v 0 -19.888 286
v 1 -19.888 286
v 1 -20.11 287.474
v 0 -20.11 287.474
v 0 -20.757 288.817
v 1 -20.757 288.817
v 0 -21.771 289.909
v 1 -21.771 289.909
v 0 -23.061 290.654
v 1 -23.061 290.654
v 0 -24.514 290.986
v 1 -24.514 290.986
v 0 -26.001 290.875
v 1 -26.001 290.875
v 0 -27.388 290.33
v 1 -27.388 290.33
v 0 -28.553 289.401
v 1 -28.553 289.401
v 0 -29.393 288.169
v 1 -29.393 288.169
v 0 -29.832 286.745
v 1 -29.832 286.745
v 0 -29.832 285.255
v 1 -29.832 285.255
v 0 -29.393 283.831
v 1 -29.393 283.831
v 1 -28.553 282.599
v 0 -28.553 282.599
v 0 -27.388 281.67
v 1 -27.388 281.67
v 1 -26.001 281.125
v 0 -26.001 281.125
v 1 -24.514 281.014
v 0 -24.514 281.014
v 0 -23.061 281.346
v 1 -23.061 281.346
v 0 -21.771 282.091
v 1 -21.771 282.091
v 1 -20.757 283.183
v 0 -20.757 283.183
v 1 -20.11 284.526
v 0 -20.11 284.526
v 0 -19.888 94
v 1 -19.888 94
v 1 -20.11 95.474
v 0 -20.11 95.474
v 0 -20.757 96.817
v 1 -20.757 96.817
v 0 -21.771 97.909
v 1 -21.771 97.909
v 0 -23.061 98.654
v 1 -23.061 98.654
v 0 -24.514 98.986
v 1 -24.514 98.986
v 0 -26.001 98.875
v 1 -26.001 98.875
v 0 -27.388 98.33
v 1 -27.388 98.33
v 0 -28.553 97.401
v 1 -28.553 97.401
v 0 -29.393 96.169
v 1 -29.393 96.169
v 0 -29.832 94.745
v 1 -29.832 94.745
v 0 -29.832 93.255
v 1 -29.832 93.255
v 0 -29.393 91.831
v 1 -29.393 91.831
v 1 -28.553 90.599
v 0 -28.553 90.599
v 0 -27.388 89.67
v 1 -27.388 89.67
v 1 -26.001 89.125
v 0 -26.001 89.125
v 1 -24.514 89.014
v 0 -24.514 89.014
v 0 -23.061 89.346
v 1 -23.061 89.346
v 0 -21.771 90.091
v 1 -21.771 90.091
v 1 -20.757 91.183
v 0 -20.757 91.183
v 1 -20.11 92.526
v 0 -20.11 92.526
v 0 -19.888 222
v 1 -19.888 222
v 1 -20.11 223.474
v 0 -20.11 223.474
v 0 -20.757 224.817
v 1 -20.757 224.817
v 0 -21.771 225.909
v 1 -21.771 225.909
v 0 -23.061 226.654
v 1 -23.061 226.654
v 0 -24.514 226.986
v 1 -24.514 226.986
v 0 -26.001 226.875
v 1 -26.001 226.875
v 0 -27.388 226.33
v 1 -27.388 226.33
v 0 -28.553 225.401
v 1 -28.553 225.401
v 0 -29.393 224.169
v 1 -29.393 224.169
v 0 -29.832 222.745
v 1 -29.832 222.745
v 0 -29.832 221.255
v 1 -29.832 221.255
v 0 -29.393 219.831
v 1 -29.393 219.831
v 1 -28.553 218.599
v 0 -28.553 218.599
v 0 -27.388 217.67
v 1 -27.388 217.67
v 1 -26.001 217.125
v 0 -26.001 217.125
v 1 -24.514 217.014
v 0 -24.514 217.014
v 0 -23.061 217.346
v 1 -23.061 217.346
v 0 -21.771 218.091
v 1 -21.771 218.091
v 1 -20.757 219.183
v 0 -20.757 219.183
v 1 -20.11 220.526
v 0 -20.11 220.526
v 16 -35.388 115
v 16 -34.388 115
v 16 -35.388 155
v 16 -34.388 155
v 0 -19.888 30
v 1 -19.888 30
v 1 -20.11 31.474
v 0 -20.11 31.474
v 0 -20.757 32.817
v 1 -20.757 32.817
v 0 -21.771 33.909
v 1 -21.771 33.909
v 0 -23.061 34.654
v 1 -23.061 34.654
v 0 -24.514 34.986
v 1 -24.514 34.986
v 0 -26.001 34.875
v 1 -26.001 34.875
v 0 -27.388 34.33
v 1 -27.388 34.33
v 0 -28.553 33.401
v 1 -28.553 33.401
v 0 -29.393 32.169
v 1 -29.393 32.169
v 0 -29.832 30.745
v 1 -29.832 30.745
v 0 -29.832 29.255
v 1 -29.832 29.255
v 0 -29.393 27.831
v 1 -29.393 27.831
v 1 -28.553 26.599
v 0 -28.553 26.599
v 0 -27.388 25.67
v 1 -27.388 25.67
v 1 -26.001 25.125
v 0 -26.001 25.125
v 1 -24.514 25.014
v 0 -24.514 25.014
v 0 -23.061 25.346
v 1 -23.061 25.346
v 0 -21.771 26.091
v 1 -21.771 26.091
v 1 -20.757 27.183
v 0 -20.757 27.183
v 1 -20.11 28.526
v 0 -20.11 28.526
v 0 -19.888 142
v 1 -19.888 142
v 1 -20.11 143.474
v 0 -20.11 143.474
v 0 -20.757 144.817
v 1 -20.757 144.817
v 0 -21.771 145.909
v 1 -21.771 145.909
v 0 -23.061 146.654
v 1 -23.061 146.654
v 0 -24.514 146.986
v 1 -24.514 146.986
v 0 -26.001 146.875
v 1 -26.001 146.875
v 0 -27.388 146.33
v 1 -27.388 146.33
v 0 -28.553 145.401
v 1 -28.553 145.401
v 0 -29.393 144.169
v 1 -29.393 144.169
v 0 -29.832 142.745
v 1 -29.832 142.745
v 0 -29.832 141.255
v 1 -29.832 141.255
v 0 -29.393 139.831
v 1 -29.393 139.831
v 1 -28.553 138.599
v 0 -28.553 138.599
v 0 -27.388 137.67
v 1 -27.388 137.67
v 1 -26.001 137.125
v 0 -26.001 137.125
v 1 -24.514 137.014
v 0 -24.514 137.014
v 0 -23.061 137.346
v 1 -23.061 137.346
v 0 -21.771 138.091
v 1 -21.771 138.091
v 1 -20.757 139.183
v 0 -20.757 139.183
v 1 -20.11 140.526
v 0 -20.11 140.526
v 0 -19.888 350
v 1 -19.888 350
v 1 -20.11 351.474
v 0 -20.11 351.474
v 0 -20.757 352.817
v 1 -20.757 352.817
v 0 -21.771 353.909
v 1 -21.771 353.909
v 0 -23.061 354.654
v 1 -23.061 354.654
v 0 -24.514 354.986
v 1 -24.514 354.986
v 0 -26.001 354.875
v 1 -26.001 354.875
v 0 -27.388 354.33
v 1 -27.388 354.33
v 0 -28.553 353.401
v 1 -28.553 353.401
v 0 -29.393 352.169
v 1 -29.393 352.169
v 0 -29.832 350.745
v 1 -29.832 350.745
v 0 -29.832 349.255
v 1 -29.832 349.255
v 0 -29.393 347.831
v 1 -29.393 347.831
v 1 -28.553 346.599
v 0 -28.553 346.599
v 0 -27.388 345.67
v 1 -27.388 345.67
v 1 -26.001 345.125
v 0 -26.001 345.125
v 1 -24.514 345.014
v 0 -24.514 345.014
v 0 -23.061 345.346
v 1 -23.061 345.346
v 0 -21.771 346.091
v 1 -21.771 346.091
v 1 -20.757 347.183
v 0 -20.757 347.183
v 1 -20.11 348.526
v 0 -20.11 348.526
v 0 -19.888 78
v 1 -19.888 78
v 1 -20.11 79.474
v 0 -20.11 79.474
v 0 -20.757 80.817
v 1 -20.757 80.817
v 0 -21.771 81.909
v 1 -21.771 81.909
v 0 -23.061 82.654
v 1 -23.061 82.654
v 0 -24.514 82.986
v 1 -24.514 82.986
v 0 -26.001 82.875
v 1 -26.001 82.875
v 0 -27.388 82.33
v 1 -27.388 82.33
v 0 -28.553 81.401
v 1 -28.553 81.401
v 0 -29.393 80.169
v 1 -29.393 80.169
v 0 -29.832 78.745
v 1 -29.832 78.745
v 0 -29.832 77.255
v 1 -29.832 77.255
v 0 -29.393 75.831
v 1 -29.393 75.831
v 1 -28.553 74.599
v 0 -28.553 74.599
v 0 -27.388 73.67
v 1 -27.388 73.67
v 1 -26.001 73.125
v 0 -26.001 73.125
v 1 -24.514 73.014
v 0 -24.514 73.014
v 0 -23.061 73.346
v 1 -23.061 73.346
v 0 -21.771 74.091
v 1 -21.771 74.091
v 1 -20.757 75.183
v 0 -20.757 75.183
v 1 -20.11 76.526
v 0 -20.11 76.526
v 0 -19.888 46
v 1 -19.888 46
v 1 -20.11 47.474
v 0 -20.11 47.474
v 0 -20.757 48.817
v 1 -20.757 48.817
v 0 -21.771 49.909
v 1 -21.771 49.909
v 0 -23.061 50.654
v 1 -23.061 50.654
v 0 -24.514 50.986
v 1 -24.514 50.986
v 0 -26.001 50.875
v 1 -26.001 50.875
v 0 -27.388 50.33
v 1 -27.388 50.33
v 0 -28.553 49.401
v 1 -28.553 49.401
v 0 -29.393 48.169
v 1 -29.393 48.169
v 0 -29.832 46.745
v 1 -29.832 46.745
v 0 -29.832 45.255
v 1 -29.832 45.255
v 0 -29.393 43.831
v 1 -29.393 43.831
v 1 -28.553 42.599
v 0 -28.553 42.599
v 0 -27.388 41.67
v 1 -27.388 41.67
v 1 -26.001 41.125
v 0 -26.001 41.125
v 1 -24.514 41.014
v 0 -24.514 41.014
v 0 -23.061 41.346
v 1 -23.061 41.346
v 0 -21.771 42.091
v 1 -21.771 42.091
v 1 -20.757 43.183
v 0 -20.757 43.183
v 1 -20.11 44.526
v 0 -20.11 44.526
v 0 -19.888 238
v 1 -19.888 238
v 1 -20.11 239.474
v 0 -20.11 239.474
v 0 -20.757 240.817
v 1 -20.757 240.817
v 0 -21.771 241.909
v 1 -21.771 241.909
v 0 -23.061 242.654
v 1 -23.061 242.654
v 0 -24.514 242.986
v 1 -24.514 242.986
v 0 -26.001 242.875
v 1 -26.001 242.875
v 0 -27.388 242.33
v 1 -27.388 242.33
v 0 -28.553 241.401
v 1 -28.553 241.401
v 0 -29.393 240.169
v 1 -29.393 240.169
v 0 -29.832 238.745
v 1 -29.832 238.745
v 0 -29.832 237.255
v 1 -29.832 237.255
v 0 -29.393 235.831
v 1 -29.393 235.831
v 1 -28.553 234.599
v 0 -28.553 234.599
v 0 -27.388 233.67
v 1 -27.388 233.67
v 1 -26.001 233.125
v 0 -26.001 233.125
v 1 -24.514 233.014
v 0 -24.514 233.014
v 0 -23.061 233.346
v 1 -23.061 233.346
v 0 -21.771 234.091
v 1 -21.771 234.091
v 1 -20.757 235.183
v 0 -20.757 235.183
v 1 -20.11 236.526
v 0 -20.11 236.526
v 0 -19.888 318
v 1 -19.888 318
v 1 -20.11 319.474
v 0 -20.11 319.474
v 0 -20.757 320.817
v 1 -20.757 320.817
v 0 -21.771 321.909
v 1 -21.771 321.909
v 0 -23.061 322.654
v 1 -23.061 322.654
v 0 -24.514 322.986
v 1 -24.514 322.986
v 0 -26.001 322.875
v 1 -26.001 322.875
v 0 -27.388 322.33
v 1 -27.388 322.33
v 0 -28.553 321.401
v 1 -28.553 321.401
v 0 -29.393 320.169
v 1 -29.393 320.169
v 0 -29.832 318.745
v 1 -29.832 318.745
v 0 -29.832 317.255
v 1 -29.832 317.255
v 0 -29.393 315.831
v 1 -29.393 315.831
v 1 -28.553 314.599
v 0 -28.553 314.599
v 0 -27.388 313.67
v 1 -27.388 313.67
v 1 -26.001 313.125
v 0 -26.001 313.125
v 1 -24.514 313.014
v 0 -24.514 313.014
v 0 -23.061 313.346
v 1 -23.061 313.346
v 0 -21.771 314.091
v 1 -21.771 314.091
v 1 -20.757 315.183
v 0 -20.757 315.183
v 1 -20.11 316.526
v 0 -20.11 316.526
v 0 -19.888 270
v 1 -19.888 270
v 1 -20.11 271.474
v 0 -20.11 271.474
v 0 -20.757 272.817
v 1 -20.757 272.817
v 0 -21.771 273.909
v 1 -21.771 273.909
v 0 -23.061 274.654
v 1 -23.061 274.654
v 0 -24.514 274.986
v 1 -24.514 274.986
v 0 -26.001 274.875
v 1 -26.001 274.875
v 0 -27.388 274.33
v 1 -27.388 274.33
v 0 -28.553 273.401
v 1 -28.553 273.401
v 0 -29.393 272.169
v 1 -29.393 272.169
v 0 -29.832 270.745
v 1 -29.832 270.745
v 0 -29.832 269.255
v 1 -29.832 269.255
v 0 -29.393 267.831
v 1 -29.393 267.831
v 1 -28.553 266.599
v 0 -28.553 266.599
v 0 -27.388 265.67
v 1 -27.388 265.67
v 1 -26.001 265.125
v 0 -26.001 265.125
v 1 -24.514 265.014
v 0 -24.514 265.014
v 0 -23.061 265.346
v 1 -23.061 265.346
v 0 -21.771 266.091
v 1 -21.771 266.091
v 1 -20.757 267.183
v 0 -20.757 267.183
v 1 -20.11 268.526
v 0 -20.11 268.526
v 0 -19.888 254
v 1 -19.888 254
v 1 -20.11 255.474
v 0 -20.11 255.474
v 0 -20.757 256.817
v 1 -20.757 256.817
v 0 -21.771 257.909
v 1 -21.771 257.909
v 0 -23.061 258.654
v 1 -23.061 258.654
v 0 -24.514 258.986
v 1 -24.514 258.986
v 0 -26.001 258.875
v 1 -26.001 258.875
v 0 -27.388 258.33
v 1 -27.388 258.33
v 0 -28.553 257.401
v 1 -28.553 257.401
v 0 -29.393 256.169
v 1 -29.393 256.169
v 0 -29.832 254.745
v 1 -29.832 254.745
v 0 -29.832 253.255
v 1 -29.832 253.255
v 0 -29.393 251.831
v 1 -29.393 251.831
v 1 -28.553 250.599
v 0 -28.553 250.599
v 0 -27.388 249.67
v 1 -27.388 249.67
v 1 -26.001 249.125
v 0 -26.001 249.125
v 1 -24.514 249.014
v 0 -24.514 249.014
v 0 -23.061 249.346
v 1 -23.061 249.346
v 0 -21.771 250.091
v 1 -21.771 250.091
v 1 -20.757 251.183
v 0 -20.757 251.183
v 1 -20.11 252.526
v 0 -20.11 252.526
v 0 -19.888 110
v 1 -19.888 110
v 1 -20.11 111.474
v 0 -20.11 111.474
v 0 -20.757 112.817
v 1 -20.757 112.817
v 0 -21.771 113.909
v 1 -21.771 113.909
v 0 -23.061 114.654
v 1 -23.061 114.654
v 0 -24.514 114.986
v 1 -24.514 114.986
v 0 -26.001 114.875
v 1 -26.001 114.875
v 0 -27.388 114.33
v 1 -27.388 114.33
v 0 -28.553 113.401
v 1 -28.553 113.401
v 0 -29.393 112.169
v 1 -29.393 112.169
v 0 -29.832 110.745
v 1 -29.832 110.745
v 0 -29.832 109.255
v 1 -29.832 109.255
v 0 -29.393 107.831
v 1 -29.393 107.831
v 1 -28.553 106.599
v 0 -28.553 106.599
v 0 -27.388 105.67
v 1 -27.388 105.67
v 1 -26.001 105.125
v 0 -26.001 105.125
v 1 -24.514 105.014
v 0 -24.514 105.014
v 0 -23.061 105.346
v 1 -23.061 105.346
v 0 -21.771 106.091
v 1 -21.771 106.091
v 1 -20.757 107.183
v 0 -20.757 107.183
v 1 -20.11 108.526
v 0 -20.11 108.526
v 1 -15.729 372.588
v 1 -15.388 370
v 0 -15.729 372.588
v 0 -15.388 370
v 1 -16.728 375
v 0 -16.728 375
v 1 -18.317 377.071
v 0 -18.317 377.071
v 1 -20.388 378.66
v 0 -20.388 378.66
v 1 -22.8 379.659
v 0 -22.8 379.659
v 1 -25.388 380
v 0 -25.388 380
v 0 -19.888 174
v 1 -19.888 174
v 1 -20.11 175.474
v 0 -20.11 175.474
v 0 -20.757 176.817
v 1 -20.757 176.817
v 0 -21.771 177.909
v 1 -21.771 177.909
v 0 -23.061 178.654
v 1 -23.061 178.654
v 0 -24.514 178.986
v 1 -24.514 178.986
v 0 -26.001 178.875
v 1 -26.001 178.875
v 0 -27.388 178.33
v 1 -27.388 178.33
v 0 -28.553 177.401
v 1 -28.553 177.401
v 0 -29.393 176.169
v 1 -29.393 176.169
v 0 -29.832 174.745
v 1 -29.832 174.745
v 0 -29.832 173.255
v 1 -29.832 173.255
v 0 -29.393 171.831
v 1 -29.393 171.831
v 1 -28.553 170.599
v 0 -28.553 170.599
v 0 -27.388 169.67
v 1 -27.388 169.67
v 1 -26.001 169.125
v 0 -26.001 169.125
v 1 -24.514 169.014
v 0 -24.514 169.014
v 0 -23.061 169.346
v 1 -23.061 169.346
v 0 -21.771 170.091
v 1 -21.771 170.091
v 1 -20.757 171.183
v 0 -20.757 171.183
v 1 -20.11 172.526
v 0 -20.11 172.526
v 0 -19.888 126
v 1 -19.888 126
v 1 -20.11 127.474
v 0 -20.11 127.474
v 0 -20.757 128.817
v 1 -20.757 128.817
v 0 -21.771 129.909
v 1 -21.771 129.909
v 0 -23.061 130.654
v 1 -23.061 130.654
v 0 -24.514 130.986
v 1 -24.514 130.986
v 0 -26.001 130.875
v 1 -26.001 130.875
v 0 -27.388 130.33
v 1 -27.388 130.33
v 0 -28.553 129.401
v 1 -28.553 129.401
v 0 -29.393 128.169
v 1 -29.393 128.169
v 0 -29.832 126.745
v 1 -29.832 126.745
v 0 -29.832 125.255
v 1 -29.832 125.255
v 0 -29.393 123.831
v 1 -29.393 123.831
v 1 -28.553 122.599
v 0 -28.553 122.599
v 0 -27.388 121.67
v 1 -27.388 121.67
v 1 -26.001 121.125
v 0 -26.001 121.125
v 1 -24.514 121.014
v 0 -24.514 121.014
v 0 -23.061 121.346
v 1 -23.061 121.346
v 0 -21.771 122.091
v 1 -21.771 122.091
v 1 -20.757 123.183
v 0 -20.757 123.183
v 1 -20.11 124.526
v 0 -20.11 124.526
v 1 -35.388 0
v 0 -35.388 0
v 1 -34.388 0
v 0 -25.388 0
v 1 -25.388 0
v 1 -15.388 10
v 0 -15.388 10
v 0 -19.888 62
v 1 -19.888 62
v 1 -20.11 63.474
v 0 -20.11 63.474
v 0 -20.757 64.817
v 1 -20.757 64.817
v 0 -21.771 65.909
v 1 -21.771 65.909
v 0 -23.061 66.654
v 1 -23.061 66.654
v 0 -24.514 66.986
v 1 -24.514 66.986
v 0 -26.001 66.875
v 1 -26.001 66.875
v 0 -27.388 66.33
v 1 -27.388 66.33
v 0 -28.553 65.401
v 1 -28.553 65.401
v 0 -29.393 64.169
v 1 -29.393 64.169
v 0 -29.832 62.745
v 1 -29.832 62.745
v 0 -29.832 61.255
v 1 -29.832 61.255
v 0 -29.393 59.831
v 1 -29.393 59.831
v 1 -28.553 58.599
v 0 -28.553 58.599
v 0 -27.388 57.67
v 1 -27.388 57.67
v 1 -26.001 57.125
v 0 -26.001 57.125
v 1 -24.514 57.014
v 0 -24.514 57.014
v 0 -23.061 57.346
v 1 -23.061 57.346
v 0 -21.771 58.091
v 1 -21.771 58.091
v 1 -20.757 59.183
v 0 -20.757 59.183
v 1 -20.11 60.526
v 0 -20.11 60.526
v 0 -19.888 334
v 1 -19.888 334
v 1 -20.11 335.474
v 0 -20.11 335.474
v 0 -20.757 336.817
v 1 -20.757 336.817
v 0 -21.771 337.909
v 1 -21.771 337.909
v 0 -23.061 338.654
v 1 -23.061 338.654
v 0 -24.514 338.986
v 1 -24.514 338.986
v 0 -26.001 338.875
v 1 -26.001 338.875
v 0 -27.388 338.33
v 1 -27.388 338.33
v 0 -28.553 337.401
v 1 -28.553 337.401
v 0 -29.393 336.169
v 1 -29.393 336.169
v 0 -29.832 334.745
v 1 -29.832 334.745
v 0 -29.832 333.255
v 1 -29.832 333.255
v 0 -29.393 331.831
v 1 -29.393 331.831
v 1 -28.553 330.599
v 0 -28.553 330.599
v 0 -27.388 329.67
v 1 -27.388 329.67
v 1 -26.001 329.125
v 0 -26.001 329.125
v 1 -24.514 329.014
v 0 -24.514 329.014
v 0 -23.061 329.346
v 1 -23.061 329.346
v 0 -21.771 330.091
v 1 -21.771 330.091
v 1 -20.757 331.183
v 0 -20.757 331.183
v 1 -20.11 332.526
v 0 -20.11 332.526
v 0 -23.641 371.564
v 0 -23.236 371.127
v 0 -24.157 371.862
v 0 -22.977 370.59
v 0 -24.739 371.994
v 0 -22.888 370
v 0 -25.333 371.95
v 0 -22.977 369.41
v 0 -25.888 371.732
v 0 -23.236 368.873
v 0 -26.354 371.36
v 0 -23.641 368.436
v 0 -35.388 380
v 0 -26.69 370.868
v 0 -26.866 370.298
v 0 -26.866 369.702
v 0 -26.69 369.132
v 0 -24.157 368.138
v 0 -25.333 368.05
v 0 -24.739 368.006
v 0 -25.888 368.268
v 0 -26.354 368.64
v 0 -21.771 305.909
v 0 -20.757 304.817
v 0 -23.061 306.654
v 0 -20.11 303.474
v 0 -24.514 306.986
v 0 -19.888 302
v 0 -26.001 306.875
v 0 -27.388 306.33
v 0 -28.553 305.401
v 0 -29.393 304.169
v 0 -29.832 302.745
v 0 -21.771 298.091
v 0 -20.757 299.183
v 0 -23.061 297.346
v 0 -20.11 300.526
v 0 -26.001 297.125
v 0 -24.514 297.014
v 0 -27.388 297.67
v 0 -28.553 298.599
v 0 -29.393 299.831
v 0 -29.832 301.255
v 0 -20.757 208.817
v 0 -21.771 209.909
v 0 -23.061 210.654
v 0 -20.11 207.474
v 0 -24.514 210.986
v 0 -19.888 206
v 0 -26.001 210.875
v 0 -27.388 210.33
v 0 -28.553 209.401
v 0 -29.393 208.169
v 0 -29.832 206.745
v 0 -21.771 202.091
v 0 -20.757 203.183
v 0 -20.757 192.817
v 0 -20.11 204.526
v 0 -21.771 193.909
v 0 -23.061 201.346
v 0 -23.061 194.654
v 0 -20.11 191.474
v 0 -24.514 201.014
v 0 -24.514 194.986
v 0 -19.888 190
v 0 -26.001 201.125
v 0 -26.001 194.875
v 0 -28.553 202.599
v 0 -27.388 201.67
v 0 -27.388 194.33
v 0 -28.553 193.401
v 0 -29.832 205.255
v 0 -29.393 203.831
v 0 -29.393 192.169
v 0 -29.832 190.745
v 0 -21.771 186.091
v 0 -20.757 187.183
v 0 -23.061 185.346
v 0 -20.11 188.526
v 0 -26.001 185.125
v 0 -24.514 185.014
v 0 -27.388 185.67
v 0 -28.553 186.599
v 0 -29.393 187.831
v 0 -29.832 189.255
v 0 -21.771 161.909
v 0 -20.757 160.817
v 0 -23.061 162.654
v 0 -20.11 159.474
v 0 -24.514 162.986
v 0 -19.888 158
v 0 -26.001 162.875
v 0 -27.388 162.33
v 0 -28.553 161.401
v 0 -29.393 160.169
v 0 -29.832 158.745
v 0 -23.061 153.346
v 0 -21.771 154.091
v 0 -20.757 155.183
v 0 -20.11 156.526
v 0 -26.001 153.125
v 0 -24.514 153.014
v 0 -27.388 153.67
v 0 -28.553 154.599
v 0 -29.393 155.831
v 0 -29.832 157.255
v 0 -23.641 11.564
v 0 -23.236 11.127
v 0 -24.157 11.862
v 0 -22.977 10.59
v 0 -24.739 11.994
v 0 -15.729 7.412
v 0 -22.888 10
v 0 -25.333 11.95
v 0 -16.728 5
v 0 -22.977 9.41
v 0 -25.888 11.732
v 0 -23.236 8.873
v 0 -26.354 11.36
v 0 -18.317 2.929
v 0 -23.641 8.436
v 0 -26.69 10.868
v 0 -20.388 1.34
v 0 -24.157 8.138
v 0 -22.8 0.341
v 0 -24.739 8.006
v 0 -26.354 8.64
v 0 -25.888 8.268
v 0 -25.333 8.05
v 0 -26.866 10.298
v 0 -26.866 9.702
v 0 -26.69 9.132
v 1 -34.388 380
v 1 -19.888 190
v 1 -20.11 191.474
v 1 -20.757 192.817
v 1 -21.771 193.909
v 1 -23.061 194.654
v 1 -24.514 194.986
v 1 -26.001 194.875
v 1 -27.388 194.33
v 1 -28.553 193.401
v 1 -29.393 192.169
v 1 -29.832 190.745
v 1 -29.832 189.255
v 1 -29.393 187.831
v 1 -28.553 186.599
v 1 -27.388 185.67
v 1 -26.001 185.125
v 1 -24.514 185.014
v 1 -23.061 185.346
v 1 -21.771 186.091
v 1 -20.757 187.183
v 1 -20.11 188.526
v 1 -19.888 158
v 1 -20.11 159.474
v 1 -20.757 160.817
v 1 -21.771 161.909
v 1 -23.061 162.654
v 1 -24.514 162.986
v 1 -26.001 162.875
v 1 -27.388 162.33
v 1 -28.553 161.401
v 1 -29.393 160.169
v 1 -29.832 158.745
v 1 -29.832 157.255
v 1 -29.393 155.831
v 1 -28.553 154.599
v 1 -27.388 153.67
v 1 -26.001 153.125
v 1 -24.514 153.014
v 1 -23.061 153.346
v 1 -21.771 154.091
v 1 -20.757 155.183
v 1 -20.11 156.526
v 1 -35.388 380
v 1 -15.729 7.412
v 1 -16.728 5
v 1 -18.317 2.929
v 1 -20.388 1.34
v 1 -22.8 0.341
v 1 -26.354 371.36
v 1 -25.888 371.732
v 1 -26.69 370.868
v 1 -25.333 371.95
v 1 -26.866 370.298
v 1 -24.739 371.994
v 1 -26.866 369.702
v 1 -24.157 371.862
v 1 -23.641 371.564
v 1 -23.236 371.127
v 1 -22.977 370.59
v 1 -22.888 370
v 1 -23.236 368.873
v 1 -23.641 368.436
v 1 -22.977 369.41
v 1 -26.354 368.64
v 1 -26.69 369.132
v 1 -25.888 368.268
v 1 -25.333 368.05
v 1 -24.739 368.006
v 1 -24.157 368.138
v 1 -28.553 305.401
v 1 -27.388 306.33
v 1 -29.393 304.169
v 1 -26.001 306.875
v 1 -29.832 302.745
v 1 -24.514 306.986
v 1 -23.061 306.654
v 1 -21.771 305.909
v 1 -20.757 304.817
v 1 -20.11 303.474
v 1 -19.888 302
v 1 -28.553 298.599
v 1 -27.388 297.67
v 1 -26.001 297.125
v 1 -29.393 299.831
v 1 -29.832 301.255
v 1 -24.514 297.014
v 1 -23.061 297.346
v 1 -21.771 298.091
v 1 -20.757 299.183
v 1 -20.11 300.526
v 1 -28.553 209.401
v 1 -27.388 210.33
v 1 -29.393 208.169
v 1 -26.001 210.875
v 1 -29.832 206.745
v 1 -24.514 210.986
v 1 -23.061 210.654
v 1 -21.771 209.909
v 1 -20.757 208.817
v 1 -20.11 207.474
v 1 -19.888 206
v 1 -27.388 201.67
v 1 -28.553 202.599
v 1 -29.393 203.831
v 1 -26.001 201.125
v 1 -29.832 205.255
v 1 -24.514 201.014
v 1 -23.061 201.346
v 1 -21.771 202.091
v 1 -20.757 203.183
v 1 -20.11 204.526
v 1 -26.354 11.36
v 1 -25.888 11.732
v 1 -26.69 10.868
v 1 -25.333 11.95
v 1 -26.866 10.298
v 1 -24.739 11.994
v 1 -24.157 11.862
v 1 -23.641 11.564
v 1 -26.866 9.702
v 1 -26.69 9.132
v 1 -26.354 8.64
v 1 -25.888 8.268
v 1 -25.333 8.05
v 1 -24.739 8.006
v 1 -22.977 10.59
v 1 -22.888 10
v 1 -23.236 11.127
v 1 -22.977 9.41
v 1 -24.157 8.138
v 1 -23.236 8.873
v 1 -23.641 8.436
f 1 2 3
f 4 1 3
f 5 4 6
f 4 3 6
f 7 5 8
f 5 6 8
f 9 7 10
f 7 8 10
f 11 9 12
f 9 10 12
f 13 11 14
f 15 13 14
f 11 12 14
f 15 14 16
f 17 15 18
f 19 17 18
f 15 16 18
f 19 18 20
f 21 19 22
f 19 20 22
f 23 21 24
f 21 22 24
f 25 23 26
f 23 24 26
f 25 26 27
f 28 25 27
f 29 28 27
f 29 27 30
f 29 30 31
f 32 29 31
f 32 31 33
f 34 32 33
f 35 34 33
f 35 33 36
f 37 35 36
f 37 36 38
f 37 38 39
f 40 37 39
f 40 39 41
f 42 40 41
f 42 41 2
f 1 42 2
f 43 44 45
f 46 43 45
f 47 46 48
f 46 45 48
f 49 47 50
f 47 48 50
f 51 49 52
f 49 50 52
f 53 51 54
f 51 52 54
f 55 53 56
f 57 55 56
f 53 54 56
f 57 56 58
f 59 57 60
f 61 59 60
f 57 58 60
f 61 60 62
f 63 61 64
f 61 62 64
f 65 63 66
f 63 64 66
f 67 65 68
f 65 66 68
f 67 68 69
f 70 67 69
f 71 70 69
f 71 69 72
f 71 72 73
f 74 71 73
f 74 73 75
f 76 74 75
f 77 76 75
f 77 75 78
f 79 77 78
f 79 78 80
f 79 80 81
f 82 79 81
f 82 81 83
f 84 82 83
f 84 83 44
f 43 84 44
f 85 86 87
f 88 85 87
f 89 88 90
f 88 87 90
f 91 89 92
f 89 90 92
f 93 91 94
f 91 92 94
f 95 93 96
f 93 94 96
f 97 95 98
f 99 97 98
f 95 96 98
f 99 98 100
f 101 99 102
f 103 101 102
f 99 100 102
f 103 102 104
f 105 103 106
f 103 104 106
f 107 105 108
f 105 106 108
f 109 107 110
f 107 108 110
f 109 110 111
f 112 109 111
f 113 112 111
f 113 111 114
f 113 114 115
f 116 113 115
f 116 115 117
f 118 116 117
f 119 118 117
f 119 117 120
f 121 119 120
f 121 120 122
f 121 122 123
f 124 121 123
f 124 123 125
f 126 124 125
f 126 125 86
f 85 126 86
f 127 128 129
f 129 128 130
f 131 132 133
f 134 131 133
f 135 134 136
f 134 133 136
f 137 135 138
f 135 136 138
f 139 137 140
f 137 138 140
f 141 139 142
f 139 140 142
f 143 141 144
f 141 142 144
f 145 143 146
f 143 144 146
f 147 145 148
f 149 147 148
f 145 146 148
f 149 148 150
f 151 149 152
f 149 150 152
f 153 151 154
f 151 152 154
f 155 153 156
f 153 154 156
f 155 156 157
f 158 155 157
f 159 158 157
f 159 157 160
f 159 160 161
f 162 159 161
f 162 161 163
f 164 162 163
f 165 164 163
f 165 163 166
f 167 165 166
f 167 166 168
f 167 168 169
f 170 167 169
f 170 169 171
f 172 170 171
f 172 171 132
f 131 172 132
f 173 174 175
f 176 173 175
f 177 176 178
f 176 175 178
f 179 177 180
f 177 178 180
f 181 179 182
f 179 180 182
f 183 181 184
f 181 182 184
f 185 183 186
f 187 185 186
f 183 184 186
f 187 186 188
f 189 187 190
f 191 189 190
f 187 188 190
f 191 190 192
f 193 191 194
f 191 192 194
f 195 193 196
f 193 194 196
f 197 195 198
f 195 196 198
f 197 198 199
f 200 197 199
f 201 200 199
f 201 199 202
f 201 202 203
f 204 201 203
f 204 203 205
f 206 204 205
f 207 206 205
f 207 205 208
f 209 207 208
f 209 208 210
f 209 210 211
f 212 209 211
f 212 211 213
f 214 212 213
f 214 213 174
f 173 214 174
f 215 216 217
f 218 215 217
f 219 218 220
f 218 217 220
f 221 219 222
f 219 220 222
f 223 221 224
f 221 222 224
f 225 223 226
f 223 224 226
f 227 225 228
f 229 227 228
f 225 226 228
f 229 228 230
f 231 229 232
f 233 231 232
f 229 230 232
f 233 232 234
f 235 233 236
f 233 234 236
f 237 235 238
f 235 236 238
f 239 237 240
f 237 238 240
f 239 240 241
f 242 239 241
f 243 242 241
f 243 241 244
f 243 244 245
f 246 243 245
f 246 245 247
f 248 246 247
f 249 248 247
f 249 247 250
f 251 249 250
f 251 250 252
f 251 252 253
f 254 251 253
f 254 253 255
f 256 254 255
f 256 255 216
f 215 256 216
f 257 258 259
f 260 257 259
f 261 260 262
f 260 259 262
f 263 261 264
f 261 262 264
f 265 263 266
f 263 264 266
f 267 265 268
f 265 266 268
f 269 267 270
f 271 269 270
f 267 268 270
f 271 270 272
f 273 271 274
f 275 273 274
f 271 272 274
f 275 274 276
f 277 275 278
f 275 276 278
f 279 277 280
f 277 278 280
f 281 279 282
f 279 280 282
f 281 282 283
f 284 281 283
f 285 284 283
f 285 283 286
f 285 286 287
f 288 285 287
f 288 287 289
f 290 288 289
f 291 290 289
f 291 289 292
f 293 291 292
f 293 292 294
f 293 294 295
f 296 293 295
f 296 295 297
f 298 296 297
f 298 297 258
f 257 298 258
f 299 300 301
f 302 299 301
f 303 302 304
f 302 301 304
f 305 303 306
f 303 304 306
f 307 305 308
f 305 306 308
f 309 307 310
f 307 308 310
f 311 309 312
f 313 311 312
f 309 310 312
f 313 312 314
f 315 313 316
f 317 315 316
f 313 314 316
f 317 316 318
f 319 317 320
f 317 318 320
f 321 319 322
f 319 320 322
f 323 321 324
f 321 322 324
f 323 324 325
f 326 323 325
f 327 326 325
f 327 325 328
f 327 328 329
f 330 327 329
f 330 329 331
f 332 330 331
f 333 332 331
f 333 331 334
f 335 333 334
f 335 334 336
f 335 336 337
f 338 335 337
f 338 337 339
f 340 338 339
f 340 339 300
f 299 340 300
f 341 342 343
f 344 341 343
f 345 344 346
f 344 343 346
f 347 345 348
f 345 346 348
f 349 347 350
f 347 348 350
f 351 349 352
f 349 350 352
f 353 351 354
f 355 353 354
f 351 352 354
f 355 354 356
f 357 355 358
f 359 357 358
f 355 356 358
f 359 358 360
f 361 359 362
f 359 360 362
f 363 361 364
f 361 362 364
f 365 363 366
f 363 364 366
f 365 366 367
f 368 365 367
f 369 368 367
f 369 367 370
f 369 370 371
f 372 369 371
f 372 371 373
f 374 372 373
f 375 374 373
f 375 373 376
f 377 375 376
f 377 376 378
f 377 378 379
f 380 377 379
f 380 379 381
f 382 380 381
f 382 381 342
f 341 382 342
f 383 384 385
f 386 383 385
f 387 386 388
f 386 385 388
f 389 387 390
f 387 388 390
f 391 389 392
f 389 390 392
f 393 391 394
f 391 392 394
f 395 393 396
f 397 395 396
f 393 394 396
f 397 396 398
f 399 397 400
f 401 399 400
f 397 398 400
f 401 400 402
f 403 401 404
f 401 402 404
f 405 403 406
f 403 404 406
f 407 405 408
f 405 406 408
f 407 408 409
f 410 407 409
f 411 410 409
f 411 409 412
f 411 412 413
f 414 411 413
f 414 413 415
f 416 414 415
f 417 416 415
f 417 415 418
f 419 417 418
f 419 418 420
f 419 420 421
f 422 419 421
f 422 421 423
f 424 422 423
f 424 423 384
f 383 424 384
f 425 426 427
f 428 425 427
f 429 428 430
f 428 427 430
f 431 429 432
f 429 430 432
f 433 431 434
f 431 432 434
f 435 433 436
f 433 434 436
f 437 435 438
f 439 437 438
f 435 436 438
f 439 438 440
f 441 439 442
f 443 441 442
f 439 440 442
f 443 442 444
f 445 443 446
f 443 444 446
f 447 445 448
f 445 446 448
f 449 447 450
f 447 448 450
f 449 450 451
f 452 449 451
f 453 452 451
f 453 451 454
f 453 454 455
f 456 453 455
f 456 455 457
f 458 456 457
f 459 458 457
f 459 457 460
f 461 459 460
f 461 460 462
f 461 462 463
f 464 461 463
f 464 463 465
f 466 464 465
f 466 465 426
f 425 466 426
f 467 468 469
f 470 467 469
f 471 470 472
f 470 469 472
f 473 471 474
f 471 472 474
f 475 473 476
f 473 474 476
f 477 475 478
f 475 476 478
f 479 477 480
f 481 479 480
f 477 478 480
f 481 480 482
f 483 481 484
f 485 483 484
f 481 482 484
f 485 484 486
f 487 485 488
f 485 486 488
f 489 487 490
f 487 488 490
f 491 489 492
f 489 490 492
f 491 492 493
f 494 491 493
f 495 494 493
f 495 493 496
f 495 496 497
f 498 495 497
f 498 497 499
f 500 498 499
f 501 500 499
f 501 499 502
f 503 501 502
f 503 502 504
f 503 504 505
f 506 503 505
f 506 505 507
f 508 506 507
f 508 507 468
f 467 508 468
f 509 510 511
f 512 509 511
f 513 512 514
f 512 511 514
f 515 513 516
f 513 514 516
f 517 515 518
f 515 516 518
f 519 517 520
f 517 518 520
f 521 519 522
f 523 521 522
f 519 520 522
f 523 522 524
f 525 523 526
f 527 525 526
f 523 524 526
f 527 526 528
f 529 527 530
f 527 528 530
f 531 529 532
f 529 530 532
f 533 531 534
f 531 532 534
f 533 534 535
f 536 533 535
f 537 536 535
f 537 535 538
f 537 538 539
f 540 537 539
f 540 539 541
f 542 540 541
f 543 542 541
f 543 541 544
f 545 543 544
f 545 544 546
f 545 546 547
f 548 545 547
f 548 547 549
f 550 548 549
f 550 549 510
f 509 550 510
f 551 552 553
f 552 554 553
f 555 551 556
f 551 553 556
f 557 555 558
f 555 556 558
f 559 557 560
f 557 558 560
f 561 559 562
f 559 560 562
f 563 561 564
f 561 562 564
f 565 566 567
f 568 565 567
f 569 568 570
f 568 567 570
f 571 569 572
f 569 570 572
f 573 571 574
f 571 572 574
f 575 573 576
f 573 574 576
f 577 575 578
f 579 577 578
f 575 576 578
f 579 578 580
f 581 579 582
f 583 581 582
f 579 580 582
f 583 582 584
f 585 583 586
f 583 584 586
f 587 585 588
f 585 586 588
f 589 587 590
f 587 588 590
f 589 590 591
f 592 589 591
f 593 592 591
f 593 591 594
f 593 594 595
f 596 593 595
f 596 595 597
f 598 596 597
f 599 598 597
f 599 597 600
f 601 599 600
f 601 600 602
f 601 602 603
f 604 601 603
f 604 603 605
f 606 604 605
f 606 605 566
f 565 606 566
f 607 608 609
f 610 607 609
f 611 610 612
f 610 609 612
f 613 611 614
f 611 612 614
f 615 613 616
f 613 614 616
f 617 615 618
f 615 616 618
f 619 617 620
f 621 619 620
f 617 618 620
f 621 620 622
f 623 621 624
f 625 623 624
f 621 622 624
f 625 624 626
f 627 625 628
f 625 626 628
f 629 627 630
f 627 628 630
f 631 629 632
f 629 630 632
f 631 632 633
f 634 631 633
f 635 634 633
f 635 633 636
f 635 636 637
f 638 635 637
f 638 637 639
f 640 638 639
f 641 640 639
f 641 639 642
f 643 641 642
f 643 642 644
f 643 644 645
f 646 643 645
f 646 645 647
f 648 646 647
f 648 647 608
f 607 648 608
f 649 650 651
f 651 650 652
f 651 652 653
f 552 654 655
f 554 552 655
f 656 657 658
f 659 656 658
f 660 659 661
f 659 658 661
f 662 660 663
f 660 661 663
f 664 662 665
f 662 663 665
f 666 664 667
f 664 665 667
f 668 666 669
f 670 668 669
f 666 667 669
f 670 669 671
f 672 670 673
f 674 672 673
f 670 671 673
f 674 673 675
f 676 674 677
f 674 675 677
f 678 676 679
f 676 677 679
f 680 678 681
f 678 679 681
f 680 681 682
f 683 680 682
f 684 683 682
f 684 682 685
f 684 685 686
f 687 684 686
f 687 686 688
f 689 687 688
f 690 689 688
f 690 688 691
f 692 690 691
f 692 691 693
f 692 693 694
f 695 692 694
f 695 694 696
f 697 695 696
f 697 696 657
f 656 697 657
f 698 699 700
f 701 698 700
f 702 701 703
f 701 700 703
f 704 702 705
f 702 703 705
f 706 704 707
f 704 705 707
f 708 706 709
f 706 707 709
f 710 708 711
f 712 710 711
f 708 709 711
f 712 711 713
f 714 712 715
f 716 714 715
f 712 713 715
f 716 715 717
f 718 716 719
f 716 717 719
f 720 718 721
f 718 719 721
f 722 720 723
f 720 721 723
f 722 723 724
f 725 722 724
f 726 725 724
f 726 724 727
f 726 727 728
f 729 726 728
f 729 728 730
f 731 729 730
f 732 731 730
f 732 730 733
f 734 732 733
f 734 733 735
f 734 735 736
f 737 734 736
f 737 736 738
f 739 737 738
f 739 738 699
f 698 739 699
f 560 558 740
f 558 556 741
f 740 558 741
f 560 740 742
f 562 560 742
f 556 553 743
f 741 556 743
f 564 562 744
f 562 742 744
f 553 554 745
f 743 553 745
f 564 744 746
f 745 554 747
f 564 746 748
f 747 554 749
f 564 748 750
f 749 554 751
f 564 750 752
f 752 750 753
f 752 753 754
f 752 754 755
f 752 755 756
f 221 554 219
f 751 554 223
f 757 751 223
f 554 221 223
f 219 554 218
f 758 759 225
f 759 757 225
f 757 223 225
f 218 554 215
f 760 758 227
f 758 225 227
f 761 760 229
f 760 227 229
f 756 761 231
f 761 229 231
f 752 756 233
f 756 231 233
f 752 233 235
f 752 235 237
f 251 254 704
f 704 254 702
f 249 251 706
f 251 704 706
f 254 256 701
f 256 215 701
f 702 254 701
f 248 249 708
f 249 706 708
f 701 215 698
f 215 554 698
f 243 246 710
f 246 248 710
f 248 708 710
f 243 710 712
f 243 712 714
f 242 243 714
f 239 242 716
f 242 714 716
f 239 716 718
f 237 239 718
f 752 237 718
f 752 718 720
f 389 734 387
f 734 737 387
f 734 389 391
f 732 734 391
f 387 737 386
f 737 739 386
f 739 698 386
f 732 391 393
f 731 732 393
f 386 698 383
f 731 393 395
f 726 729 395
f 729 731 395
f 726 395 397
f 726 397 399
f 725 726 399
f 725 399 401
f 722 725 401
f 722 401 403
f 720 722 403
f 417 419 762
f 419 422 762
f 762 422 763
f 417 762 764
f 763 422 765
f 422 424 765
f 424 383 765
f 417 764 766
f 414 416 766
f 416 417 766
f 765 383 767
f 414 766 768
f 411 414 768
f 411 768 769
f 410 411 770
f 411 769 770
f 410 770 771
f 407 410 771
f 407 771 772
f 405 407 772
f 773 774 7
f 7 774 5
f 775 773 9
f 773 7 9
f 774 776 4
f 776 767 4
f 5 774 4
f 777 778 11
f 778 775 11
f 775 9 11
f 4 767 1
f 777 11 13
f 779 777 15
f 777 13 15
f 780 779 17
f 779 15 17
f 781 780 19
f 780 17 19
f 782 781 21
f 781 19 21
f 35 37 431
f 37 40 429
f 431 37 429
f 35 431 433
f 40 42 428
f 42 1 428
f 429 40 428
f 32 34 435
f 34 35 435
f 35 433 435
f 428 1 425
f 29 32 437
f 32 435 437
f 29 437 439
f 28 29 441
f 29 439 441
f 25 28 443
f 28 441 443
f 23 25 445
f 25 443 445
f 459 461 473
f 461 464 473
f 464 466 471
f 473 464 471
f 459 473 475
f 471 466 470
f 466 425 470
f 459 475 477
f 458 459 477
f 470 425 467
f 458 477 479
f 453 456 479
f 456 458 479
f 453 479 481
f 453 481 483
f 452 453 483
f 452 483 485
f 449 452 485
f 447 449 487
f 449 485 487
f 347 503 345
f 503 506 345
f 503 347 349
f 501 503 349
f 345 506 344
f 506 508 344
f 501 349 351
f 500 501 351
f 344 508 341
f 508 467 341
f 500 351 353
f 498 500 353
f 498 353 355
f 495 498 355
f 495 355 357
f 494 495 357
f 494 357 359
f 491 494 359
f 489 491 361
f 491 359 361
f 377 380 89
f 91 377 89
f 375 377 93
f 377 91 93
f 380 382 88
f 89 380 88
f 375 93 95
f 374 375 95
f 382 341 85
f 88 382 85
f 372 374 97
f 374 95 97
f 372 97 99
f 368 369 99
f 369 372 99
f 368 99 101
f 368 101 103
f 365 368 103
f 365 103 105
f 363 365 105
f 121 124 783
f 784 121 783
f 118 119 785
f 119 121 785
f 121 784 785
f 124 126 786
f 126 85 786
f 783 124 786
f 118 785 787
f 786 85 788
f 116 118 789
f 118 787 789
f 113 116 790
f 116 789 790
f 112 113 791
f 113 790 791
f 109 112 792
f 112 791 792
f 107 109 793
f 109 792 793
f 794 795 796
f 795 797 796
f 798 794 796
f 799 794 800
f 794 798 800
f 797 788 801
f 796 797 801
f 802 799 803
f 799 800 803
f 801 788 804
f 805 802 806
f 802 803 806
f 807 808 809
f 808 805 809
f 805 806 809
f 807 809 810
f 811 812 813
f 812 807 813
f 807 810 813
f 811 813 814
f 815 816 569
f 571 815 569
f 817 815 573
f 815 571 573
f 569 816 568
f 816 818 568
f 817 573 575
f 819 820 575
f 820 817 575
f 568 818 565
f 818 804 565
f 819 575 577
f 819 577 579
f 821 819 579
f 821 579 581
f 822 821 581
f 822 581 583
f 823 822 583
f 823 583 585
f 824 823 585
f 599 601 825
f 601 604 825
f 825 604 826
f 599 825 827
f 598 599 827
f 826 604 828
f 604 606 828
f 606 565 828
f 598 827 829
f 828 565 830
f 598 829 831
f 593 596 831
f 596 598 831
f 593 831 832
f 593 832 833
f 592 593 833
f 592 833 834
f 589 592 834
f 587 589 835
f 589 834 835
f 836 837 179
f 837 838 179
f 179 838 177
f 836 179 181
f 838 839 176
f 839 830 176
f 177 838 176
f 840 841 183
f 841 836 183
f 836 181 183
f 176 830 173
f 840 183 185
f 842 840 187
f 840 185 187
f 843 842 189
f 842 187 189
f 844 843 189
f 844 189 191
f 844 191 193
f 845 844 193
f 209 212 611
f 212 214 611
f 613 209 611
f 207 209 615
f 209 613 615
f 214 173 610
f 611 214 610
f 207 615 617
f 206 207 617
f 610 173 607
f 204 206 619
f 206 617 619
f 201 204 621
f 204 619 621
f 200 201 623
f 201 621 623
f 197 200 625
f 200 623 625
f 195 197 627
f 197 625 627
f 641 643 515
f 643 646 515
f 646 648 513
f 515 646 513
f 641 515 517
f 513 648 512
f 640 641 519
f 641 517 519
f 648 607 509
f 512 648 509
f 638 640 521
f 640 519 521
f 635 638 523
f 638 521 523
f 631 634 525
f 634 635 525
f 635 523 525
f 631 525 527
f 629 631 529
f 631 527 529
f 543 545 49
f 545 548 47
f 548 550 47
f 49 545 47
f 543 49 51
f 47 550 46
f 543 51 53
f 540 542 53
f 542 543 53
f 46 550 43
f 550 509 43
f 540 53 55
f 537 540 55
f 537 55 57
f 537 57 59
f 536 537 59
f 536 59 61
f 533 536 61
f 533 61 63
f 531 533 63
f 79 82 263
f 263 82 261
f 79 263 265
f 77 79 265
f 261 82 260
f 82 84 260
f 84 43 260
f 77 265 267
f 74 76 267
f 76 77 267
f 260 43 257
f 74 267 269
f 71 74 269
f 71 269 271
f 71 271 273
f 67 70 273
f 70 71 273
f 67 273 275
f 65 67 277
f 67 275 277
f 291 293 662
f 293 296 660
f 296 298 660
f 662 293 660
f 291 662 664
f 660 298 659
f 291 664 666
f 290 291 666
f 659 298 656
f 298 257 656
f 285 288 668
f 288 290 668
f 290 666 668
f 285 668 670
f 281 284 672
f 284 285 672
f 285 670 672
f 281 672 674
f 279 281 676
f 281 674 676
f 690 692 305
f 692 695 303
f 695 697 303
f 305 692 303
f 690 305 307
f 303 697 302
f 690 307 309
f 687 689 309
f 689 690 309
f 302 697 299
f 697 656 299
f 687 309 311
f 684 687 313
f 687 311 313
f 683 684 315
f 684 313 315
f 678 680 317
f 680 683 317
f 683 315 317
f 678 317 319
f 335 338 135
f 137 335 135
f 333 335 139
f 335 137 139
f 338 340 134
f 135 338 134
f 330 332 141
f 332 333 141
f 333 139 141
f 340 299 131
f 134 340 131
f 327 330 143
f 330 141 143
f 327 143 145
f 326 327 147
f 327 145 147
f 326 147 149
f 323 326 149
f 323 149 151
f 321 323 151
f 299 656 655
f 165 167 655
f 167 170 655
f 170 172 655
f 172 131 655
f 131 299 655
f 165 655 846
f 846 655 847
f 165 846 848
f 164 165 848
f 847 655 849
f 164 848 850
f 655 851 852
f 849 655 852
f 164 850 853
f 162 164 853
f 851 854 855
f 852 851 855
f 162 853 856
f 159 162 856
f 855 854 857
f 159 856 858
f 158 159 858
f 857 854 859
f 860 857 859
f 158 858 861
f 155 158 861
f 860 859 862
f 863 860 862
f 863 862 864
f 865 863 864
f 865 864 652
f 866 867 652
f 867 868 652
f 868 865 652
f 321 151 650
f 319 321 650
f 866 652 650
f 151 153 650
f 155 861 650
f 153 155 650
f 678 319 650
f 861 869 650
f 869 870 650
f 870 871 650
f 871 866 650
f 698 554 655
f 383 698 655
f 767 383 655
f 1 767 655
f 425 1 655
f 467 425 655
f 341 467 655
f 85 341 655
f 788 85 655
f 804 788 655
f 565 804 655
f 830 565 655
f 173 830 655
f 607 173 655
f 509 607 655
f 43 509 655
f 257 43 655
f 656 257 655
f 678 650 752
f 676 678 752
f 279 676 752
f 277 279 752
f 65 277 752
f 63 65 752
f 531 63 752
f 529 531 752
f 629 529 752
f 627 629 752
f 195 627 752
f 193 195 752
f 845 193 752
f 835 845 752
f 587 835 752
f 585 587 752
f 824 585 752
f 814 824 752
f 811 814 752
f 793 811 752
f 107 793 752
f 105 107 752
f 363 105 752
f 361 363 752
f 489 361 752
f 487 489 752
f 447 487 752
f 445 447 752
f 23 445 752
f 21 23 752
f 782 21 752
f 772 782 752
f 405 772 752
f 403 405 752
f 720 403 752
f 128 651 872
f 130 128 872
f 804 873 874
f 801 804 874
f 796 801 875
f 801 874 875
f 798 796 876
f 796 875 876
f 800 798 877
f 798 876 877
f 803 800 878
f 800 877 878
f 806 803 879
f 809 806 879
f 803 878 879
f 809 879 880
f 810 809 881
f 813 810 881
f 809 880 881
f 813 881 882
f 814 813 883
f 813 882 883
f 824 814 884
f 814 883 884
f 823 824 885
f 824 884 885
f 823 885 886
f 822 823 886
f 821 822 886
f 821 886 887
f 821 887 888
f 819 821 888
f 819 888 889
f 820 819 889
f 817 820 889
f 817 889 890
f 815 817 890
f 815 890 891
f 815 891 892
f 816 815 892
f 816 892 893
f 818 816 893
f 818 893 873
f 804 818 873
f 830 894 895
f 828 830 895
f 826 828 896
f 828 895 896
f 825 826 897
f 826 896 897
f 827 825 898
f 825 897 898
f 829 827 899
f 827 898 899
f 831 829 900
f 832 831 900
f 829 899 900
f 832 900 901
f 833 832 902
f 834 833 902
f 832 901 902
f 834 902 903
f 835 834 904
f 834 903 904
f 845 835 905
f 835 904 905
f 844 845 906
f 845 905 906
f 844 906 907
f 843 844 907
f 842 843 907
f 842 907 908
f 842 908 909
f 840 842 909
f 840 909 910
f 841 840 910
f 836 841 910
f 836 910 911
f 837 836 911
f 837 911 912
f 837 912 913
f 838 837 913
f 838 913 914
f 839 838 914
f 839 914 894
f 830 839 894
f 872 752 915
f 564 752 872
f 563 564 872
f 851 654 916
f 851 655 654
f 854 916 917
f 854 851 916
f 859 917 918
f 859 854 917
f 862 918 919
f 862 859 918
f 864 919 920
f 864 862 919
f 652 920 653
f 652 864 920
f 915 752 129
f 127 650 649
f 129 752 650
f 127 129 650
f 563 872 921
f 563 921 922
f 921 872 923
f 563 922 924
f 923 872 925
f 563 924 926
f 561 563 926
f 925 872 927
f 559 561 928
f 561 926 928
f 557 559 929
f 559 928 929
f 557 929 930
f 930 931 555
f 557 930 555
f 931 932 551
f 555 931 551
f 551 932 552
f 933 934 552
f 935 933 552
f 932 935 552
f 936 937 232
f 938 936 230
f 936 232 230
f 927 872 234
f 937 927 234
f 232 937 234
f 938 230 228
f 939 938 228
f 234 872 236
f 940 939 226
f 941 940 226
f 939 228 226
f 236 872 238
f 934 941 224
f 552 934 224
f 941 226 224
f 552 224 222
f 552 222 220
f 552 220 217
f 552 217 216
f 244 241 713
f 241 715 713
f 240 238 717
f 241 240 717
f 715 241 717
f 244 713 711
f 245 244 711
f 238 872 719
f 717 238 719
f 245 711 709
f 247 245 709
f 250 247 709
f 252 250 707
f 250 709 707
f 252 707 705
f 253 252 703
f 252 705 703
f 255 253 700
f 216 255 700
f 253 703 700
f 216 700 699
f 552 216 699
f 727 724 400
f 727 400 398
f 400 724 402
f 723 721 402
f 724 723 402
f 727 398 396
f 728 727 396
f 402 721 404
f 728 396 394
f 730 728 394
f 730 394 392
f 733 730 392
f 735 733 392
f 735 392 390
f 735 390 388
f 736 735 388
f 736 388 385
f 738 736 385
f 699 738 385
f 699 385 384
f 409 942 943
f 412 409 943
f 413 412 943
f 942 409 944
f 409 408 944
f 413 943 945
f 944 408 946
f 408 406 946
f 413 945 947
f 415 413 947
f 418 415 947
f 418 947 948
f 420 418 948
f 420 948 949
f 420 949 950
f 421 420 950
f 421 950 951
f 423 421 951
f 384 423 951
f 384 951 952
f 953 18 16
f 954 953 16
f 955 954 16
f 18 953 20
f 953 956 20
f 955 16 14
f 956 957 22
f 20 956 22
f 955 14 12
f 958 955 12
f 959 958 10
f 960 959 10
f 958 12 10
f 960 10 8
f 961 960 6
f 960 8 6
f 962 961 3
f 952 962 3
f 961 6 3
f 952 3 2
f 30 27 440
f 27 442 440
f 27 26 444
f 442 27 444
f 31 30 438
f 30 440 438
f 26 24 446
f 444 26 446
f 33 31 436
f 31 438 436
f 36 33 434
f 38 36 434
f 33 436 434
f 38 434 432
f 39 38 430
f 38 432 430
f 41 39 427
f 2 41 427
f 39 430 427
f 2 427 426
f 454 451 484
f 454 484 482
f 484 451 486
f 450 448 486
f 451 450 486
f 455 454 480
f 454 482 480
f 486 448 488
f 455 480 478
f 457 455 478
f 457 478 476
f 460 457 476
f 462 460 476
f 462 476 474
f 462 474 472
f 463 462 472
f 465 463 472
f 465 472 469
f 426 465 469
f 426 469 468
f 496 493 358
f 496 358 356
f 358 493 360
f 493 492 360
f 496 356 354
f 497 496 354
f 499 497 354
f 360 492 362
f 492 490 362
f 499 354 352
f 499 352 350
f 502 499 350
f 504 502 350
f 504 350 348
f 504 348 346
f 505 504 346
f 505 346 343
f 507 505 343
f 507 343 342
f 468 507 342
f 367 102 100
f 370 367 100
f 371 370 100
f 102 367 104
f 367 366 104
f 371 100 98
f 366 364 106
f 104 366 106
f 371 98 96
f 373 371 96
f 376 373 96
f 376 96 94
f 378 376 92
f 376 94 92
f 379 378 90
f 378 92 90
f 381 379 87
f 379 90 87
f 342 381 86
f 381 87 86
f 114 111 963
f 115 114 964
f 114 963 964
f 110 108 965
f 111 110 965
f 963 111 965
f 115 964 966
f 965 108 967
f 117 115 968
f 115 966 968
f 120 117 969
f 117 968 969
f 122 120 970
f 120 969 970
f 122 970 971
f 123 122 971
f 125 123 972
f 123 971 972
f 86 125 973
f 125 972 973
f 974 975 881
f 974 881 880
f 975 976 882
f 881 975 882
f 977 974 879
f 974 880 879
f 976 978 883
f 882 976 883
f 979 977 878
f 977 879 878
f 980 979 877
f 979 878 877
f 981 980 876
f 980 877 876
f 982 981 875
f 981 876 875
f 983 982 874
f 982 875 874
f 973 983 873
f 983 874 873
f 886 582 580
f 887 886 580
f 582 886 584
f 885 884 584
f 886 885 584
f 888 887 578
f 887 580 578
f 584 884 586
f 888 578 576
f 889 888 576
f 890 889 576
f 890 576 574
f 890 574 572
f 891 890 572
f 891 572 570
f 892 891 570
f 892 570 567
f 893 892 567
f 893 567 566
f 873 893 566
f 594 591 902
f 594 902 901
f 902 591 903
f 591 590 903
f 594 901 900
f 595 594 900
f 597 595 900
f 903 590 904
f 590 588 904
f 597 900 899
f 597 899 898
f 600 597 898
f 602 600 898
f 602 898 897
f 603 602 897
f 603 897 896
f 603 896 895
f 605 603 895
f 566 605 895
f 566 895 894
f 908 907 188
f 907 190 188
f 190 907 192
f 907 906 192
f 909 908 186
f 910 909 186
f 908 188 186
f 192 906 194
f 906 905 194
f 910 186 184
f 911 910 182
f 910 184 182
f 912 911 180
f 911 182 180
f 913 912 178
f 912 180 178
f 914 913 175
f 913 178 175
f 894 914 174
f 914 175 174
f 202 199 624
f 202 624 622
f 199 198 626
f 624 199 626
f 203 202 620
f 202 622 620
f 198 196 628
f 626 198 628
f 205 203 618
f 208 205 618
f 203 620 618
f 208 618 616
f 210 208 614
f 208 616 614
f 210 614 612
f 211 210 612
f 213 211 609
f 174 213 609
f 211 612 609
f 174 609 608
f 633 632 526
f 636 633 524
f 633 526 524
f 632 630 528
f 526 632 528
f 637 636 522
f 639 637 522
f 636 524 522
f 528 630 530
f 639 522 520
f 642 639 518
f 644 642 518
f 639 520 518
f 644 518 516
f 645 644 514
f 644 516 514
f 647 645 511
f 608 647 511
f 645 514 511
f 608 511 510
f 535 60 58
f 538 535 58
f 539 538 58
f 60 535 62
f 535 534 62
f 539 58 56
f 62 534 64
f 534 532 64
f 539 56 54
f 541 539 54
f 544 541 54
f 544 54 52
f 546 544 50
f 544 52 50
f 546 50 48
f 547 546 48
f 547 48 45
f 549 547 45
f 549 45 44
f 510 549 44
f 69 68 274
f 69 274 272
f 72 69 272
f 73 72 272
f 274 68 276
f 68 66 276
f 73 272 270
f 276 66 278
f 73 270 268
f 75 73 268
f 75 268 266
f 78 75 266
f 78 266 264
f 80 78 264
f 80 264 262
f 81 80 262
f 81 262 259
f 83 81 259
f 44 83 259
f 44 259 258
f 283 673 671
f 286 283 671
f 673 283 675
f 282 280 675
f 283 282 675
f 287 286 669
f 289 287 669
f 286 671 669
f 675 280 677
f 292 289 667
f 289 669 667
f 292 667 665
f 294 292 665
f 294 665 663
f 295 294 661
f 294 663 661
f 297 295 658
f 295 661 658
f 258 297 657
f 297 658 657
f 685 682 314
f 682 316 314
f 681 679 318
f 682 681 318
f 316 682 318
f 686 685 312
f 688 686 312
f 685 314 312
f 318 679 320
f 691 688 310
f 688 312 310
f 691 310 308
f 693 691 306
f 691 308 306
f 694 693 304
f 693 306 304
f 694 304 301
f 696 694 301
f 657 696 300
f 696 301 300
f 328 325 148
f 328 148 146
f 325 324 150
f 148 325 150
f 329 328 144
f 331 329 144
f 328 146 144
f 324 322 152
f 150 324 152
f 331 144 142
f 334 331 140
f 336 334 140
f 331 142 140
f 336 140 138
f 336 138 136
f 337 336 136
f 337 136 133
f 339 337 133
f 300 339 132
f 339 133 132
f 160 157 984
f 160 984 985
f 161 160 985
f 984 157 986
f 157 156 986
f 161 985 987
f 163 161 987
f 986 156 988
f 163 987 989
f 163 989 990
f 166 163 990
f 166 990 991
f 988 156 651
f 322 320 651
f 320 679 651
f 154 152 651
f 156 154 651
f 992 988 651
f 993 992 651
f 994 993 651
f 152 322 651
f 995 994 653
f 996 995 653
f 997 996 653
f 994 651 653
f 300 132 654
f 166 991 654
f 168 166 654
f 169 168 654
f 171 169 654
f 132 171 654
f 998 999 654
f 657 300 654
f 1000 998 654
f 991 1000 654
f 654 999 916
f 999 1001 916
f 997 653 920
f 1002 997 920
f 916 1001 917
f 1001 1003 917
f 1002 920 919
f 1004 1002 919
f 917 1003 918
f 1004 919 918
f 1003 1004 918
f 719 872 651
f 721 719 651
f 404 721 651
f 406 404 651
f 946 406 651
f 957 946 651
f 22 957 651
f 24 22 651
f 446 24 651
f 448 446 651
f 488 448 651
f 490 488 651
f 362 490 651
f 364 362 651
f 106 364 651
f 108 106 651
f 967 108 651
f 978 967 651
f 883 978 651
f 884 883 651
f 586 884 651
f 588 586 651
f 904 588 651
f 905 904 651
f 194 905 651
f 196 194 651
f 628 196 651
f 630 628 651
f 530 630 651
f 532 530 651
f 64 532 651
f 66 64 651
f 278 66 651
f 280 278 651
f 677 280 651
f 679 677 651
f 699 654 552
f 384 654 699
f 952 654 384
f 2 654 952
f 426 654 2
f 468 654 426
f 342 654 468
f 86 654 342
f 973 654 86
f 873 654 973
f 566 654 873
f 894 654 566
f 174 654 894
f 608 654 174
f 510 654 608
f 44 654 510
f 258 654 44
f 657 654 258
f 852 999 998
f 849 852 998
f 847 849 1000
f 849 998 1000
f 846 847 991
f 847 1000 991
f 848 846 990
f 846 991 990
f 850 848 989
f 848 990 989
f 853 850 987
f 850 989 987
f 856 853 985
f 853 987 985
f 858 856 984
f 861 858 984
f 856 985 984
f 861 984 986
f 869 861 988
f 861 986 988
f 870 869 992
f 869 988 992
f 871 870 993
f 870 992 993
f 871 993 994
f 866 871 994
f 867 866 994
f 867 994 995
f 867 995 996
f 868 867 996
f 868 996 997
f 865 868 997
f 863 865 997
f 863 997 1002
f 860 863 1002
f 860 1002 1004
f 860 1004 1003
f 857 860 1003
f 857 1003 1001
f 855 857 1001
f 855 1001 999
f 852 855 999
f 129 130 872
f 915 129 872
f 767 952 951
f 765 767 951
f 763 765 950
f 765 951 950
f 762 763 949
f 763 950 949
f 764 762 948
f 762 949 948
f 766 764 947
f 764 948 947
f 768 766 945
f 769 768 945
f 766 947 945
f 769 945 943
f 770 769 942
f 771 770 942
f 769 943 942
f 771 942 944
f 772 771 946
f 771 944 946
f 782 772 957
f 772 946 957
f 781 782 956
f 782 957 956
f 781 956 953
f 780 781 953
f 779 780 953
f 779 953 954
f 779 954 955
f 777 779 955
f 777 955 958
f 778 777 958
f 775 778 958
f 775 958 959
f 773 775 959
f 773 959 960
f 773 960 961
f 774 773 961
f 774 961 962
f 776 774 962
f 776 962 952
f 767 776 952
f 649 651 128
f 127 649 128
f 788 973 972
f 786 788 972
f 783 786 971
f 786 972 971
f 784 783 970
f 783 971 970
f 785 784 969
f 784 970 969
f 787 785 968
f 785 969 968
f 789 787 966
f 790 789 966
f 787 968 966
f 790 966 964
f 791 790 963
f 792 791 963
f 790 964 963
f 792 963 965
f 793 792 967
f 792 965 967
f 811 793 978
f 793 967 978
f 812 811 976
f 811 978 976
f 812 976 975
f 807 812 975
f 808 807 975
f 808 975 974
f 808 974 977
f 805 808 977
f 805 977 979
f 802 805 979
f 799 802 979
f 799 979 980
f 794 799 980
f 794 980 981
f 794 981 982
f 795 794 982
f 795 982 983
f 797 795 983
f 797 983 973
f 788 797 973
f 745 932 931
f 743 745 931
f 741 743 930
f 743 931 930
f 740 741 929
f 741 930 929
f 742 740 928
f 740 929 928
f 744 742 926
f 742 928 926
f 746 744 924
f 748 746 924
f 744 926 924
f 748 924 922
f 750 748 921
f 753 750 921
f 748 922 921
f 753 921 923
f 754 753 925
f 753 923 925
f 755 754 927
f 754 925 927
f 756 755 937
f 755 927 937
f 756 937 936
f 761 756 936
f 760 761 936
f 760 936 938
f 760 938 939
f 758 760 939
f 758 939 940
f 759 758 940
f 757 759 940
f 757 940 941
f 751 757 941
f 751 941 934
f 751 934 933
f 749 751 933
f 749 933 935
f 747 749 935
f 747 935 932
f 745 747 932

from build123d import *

# Parameters (mm, degrees)
BOSS_EXTRUDE1_DEPTH = 380
SKETCH2_R           = 2
CUT_EXTRUDE1_DEPTH  = 10
CUT_EXTRUDE2_DEPTH  = 10
SKETCH5_R           = 5
CUT_EXTRUDE3_DEPTH  = 10
LPATTERN1_COUNT     = 21
LPATTERN1_PITCH     = 16
FILLET1_R           = 10


with BuildPart() as part:
    # Sketch1 → Boss-Extrude1 (new body)
    with BuildSketch(Plane.XY):
        Polygon((0, -15.388010819), (0, -35.388010819), (20, -35.388010819), (20, -34.388010819), (1, -34.388010819), (1, -15.388010819), align=None)
    extrude(amount=BOSS_EXTRUDE1_DEPTH)

    # Sketch2 → Cut-Extrude1 (cut)
    with BuildSketch(Plane(origin=(1, 0, 0), x_dir=(0, 0, -1), z_dir=(1, 0, 0))):
        with Locations(Location((-10, -24.888010819, 0), (0, 0, 90))):
            Circle(SKETCH2_R)
        with Locations(Location((-370, -24.888010819, 0), (0, 0, 90))):
            Circle(SKETCH2_R)
    extrude(amount=-CUT_EXTRUDE1_DEPTH, mode=Mode.SUBTRACT)

    # Sketch4 → Cut-Extrude2 (cut)
    with BuildSketch(Plane(origin=(0, -34.388010819, 0), x_dir=(1, 0, 0), z_dir=(0, 1, 0))):
        Polygon((1, 0), (16, -115), (16, -155), (1, -380), (1, -389.212459491), (24.909334079, -389.212459491), (24.909334079, 2.402258562), (1, 2.402258562), align=None)
    extrude(amount=-CUT_EXTRUDE2_DEPTH, mode=Mode.SUBTRACT)

    # Sketch5 → Cut-Extrude3 (cut)
    with BuildSketch(Plane(origin=(1, 0, 0), x_dir=(0, 0, -1), z_dir=(1, 0, 0))):
        with Locations(Location((-350, -24.888010819, 0), (0, 0, 90))):
            Circle(SKETCH5_R)
    cut_extrude3 = extrude(amount=-CUT_EXTRUDE3_DEPTH, mode=Mode.SUBTRACT)

    # LPattern1: Cut-Extrude3 ×21
    with Locations(*[(0, 0, -i * LPATTERN1_PITCH) for i in range(1, LPATTERN1_COUNT)]):
        add(cut_extrude3, mode=Mode.SUBTRACT)

    # Fillet1
    fillet1_edges = [part.edges().sort_by_distance(p)[0] for p in [
        (0.5, -15.388010819, 380),
        (0.5, -15.388010819, 0),
    ]]
    fillet(fillet1_edges, radius=FILLET1_R)


solid = part.part
